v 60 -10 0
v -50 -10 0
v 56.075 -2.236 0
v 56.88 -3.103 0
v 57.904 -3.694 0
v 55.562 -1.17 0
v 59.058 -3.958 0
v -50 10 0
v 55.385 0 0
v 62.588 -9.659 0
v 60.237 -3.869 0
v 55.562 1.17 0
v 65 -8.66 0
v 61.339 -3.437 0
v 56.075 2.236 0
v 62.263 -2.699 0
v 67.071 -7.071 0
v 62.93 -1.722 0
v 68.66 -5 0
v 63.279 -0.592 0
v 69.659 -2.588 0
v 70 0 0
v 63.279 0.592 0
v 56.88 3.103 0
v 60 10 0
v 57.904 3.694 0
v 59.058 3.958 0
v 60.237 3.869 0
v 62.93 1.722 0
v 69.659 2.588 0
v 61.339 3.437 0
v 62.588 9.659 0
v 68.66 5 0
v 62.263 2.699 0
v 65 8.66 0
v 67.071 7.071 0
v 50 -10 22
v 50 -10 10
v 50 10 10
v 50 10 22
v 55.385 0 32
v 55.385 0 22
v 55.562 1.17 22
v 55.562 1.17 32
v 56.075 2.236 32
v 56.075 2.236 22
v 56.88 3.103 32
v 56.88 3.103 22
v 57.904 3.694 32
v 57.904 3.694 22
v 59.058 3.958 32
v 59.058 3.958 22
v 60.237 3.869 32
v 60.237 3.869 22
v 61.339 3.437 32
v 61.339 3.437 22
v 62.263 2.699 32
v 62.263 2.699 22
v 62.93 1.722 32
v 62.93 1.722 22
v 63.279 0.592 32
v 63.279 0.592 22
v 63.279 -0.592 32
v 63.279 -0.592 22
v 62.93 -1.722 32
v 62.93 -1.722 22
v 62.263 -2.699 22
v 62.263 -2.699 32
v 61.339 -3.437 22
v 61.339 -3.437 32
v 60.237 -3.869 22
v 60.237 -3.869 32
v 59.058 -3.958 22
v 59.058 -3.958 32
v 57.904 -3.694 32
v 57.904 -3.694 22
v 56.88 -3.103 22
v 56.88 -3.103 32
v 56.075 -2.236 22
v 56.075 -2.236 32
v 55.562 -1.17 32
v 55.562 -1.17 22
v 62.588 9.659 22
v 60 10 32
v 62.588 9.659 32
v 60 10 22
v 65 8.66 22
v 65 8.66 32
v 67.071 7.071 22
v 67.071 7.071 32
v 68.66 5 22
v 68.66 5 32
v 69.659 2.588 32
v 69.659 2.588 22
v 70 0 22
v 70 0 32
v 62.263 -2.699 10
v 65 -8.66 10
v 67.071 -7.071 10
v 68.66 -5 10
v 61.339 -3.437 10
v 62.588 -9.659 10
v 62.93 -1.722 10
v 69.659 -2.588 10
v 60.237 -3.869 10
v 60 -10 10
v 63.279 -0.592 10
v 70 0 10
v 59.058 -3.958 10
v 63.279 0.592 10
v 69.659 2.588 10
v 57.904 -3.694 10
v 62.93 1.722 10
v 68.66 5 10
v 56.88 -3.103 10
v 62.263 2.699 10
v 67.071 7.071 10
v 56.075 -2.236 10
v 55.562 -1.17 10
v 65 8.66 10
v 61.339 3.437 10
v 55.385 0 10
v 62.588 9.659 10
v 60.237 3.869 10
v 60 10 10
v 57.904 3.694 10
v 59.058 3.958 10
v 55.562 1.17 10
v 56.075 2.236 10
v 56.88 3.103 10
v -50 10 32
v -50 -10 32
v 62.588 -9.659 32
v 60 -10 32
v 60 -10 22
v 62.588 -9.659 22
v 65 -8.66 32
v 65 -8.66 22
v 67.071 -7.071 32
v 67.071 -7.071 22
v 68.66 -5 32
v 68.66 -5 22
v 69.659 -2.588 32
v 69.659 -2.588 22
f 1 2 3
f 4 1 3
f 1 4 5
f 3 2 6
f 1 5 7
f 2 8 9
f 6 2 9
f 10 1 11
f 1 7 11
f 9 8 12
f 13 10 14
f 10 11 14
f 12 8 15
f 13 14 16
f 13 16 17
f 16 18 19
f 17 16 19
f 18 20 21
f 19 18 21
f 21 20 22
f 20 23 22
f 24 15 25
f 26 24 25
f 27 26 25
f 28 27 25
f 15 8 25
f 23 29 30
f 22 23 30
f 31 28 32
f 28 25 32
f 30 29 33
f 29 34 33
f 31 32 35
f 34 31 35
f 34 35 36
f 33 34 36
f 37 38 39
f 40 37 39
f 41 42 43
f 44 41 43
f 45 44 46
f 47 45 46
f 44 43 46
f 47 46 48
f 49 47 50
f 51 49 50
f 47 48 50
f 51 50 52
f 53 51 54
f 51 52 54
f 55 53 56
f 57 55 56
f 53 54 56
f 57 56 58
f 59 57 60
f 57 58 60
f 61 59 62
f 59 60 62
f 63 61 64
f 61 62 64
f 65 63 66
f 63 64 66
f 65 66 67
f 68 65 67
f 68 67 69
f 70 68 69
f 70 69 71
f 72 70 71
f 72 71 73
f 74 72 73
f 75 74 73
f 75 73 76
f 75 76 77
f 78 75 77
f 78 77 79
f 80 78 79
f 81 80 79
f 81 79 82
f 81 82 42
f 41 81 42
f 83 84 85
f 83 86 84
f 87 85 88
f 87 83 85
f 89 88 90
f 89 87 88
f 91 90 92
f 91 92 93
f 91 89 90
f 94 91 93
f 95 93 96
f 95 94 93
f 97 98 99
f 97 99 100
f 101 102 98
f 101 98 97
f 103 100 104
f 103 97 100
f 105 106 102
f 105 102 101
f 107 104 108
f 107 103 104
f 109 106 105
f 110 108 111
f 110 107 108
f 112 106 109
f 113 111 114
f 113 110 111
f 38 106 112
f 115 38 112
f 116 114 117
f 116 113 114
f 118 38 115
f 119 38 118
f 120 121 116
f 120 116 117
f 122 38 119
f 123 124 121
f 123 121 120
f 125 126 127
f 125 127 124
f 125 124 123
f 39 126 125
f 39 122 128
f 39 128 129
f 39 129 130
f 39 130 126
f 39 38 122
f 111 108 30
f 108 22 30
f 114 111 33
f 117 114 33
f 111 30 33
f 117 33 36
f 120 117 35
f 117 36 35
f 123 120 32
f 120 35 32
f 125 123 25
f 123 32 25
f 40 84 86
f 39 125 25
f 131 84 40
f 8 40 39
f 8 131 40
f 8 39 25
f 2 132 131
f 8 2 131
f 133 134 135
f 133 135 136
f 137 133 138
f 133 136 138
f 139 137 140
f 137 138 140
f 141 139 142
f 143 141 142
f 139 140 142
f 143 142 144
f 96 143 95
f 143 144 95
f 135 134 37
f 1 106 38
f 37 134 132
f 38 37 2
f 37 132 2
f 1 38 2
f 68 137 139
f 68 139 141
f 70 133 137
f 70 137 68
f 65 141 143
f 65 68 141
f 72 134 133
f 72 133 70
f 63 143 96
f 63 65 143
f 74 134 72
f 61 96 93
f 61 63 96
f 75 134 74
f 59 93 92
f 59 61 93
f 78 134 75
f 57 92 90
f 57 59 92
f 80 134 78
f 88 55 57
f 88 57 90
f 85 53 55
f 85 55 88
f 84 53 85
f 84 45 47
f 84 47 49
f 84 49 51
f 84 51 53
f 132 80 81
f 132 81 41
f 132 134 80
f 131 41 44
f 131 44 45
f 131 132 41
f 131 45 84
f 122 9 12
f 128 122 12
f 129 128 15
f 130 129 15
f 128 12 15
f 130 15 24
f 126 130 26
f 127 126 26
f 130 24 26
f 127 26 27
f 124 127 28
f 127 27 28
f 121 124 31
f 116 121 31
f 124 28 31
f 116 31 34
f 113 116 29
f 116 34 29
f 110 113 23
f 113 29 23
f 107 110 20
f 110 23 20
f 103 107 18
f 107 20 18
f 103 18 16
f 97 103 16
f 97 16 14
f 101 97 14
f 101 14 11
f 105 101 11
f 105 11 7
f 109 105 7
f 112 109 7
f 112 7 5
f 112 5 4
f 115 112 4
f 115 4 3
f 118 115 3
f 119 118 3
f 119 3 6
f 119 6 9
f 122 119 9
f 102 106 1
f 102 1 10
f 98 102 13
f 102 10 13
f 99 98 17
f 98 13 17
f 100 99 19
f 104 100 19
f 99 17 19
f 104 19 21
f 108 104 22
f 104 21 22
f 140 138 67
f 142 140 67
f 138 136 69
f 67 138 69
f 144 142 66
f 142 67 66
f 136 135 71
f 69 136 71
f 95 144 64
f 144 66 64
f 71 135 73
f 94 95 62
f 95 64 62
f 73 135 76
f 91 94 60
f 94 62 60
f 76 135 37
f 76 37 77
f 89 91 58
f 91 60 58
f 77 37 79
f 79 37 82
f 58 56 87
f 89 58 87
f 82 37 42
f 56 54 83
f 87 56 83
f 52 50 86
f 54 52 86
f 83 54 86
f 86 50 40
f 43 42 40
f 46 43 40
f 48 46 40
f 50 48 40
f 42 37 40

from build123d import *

# Parameters (mm, degrees)
ESQUISSE2_W             = 100
ESQUISSE2_H             = 20
BOSS_EXTRU_1_DEPTH      = 32
ESQUISSE6_W             = 10
ESQUISSE6_H             = 20
BOSS_EXTRU_3_DEPTH      = 20
CONG_2_R                = 10
ESQUISSE7_R             = 3.96875
ENL_V_MAT_EXTRU_1_DEPTH = 78.614431648


with BuildPart() as part:
    # Esquisse2 → Boss.-Extru.1 (new body)
    with BuildSketch(Plane.XY):
        Rectangle(ESQUISSE2_W, ESQUISSE2_H)
    extrude(amount=BOSS_EXTRU_1_DEPTH)

    # Esquisse6 → Boss.-Extru.3 (add)
    with BuildSketch(Plane(origin=(50, 0, 0), x_dir=(0, 0, -1), z_dir=(1, 0, 0))):
        with Locations((-27, 0)):
            Rectangle(ESQUISSE6_W, ESQUISSE6_H)
        with Locations((-5, 0)):
            Rectangle(ESQUISSE6_W, ESQUISSE6_H)
    extrude(amount=BOSS_EXTRU_3_DEPTH)

    # Congé2
    cong_2_edges = [part.edges().sort_by_distance(p)[0] for p in [
        (70, -10, 27),
        (70, -10, 5),
        (70, 10, 5),
        (70, 10, 27),
    ]]
    fillet(cong_2_edges, radius=CONG_2_R - 0.0001)  # a hair under: the kernel refuses the full size

    # Esquisse7 → Enlèv. mat.-Extru.1 (cut, through all)
    with BuildSketch(Plane(origin=(0, 0, 0), x_dir=(-1, 0, 0), z_dir=(0, 0, -1))):
        with Locations((-59.35415424, 0)):
            Circle(ESQUISSE7_R)
    extrude(amount=-ENL_V_MAT_EXTRU_1_DEPTH, mode=Mode.SUBTRACT)


solid = part.part
